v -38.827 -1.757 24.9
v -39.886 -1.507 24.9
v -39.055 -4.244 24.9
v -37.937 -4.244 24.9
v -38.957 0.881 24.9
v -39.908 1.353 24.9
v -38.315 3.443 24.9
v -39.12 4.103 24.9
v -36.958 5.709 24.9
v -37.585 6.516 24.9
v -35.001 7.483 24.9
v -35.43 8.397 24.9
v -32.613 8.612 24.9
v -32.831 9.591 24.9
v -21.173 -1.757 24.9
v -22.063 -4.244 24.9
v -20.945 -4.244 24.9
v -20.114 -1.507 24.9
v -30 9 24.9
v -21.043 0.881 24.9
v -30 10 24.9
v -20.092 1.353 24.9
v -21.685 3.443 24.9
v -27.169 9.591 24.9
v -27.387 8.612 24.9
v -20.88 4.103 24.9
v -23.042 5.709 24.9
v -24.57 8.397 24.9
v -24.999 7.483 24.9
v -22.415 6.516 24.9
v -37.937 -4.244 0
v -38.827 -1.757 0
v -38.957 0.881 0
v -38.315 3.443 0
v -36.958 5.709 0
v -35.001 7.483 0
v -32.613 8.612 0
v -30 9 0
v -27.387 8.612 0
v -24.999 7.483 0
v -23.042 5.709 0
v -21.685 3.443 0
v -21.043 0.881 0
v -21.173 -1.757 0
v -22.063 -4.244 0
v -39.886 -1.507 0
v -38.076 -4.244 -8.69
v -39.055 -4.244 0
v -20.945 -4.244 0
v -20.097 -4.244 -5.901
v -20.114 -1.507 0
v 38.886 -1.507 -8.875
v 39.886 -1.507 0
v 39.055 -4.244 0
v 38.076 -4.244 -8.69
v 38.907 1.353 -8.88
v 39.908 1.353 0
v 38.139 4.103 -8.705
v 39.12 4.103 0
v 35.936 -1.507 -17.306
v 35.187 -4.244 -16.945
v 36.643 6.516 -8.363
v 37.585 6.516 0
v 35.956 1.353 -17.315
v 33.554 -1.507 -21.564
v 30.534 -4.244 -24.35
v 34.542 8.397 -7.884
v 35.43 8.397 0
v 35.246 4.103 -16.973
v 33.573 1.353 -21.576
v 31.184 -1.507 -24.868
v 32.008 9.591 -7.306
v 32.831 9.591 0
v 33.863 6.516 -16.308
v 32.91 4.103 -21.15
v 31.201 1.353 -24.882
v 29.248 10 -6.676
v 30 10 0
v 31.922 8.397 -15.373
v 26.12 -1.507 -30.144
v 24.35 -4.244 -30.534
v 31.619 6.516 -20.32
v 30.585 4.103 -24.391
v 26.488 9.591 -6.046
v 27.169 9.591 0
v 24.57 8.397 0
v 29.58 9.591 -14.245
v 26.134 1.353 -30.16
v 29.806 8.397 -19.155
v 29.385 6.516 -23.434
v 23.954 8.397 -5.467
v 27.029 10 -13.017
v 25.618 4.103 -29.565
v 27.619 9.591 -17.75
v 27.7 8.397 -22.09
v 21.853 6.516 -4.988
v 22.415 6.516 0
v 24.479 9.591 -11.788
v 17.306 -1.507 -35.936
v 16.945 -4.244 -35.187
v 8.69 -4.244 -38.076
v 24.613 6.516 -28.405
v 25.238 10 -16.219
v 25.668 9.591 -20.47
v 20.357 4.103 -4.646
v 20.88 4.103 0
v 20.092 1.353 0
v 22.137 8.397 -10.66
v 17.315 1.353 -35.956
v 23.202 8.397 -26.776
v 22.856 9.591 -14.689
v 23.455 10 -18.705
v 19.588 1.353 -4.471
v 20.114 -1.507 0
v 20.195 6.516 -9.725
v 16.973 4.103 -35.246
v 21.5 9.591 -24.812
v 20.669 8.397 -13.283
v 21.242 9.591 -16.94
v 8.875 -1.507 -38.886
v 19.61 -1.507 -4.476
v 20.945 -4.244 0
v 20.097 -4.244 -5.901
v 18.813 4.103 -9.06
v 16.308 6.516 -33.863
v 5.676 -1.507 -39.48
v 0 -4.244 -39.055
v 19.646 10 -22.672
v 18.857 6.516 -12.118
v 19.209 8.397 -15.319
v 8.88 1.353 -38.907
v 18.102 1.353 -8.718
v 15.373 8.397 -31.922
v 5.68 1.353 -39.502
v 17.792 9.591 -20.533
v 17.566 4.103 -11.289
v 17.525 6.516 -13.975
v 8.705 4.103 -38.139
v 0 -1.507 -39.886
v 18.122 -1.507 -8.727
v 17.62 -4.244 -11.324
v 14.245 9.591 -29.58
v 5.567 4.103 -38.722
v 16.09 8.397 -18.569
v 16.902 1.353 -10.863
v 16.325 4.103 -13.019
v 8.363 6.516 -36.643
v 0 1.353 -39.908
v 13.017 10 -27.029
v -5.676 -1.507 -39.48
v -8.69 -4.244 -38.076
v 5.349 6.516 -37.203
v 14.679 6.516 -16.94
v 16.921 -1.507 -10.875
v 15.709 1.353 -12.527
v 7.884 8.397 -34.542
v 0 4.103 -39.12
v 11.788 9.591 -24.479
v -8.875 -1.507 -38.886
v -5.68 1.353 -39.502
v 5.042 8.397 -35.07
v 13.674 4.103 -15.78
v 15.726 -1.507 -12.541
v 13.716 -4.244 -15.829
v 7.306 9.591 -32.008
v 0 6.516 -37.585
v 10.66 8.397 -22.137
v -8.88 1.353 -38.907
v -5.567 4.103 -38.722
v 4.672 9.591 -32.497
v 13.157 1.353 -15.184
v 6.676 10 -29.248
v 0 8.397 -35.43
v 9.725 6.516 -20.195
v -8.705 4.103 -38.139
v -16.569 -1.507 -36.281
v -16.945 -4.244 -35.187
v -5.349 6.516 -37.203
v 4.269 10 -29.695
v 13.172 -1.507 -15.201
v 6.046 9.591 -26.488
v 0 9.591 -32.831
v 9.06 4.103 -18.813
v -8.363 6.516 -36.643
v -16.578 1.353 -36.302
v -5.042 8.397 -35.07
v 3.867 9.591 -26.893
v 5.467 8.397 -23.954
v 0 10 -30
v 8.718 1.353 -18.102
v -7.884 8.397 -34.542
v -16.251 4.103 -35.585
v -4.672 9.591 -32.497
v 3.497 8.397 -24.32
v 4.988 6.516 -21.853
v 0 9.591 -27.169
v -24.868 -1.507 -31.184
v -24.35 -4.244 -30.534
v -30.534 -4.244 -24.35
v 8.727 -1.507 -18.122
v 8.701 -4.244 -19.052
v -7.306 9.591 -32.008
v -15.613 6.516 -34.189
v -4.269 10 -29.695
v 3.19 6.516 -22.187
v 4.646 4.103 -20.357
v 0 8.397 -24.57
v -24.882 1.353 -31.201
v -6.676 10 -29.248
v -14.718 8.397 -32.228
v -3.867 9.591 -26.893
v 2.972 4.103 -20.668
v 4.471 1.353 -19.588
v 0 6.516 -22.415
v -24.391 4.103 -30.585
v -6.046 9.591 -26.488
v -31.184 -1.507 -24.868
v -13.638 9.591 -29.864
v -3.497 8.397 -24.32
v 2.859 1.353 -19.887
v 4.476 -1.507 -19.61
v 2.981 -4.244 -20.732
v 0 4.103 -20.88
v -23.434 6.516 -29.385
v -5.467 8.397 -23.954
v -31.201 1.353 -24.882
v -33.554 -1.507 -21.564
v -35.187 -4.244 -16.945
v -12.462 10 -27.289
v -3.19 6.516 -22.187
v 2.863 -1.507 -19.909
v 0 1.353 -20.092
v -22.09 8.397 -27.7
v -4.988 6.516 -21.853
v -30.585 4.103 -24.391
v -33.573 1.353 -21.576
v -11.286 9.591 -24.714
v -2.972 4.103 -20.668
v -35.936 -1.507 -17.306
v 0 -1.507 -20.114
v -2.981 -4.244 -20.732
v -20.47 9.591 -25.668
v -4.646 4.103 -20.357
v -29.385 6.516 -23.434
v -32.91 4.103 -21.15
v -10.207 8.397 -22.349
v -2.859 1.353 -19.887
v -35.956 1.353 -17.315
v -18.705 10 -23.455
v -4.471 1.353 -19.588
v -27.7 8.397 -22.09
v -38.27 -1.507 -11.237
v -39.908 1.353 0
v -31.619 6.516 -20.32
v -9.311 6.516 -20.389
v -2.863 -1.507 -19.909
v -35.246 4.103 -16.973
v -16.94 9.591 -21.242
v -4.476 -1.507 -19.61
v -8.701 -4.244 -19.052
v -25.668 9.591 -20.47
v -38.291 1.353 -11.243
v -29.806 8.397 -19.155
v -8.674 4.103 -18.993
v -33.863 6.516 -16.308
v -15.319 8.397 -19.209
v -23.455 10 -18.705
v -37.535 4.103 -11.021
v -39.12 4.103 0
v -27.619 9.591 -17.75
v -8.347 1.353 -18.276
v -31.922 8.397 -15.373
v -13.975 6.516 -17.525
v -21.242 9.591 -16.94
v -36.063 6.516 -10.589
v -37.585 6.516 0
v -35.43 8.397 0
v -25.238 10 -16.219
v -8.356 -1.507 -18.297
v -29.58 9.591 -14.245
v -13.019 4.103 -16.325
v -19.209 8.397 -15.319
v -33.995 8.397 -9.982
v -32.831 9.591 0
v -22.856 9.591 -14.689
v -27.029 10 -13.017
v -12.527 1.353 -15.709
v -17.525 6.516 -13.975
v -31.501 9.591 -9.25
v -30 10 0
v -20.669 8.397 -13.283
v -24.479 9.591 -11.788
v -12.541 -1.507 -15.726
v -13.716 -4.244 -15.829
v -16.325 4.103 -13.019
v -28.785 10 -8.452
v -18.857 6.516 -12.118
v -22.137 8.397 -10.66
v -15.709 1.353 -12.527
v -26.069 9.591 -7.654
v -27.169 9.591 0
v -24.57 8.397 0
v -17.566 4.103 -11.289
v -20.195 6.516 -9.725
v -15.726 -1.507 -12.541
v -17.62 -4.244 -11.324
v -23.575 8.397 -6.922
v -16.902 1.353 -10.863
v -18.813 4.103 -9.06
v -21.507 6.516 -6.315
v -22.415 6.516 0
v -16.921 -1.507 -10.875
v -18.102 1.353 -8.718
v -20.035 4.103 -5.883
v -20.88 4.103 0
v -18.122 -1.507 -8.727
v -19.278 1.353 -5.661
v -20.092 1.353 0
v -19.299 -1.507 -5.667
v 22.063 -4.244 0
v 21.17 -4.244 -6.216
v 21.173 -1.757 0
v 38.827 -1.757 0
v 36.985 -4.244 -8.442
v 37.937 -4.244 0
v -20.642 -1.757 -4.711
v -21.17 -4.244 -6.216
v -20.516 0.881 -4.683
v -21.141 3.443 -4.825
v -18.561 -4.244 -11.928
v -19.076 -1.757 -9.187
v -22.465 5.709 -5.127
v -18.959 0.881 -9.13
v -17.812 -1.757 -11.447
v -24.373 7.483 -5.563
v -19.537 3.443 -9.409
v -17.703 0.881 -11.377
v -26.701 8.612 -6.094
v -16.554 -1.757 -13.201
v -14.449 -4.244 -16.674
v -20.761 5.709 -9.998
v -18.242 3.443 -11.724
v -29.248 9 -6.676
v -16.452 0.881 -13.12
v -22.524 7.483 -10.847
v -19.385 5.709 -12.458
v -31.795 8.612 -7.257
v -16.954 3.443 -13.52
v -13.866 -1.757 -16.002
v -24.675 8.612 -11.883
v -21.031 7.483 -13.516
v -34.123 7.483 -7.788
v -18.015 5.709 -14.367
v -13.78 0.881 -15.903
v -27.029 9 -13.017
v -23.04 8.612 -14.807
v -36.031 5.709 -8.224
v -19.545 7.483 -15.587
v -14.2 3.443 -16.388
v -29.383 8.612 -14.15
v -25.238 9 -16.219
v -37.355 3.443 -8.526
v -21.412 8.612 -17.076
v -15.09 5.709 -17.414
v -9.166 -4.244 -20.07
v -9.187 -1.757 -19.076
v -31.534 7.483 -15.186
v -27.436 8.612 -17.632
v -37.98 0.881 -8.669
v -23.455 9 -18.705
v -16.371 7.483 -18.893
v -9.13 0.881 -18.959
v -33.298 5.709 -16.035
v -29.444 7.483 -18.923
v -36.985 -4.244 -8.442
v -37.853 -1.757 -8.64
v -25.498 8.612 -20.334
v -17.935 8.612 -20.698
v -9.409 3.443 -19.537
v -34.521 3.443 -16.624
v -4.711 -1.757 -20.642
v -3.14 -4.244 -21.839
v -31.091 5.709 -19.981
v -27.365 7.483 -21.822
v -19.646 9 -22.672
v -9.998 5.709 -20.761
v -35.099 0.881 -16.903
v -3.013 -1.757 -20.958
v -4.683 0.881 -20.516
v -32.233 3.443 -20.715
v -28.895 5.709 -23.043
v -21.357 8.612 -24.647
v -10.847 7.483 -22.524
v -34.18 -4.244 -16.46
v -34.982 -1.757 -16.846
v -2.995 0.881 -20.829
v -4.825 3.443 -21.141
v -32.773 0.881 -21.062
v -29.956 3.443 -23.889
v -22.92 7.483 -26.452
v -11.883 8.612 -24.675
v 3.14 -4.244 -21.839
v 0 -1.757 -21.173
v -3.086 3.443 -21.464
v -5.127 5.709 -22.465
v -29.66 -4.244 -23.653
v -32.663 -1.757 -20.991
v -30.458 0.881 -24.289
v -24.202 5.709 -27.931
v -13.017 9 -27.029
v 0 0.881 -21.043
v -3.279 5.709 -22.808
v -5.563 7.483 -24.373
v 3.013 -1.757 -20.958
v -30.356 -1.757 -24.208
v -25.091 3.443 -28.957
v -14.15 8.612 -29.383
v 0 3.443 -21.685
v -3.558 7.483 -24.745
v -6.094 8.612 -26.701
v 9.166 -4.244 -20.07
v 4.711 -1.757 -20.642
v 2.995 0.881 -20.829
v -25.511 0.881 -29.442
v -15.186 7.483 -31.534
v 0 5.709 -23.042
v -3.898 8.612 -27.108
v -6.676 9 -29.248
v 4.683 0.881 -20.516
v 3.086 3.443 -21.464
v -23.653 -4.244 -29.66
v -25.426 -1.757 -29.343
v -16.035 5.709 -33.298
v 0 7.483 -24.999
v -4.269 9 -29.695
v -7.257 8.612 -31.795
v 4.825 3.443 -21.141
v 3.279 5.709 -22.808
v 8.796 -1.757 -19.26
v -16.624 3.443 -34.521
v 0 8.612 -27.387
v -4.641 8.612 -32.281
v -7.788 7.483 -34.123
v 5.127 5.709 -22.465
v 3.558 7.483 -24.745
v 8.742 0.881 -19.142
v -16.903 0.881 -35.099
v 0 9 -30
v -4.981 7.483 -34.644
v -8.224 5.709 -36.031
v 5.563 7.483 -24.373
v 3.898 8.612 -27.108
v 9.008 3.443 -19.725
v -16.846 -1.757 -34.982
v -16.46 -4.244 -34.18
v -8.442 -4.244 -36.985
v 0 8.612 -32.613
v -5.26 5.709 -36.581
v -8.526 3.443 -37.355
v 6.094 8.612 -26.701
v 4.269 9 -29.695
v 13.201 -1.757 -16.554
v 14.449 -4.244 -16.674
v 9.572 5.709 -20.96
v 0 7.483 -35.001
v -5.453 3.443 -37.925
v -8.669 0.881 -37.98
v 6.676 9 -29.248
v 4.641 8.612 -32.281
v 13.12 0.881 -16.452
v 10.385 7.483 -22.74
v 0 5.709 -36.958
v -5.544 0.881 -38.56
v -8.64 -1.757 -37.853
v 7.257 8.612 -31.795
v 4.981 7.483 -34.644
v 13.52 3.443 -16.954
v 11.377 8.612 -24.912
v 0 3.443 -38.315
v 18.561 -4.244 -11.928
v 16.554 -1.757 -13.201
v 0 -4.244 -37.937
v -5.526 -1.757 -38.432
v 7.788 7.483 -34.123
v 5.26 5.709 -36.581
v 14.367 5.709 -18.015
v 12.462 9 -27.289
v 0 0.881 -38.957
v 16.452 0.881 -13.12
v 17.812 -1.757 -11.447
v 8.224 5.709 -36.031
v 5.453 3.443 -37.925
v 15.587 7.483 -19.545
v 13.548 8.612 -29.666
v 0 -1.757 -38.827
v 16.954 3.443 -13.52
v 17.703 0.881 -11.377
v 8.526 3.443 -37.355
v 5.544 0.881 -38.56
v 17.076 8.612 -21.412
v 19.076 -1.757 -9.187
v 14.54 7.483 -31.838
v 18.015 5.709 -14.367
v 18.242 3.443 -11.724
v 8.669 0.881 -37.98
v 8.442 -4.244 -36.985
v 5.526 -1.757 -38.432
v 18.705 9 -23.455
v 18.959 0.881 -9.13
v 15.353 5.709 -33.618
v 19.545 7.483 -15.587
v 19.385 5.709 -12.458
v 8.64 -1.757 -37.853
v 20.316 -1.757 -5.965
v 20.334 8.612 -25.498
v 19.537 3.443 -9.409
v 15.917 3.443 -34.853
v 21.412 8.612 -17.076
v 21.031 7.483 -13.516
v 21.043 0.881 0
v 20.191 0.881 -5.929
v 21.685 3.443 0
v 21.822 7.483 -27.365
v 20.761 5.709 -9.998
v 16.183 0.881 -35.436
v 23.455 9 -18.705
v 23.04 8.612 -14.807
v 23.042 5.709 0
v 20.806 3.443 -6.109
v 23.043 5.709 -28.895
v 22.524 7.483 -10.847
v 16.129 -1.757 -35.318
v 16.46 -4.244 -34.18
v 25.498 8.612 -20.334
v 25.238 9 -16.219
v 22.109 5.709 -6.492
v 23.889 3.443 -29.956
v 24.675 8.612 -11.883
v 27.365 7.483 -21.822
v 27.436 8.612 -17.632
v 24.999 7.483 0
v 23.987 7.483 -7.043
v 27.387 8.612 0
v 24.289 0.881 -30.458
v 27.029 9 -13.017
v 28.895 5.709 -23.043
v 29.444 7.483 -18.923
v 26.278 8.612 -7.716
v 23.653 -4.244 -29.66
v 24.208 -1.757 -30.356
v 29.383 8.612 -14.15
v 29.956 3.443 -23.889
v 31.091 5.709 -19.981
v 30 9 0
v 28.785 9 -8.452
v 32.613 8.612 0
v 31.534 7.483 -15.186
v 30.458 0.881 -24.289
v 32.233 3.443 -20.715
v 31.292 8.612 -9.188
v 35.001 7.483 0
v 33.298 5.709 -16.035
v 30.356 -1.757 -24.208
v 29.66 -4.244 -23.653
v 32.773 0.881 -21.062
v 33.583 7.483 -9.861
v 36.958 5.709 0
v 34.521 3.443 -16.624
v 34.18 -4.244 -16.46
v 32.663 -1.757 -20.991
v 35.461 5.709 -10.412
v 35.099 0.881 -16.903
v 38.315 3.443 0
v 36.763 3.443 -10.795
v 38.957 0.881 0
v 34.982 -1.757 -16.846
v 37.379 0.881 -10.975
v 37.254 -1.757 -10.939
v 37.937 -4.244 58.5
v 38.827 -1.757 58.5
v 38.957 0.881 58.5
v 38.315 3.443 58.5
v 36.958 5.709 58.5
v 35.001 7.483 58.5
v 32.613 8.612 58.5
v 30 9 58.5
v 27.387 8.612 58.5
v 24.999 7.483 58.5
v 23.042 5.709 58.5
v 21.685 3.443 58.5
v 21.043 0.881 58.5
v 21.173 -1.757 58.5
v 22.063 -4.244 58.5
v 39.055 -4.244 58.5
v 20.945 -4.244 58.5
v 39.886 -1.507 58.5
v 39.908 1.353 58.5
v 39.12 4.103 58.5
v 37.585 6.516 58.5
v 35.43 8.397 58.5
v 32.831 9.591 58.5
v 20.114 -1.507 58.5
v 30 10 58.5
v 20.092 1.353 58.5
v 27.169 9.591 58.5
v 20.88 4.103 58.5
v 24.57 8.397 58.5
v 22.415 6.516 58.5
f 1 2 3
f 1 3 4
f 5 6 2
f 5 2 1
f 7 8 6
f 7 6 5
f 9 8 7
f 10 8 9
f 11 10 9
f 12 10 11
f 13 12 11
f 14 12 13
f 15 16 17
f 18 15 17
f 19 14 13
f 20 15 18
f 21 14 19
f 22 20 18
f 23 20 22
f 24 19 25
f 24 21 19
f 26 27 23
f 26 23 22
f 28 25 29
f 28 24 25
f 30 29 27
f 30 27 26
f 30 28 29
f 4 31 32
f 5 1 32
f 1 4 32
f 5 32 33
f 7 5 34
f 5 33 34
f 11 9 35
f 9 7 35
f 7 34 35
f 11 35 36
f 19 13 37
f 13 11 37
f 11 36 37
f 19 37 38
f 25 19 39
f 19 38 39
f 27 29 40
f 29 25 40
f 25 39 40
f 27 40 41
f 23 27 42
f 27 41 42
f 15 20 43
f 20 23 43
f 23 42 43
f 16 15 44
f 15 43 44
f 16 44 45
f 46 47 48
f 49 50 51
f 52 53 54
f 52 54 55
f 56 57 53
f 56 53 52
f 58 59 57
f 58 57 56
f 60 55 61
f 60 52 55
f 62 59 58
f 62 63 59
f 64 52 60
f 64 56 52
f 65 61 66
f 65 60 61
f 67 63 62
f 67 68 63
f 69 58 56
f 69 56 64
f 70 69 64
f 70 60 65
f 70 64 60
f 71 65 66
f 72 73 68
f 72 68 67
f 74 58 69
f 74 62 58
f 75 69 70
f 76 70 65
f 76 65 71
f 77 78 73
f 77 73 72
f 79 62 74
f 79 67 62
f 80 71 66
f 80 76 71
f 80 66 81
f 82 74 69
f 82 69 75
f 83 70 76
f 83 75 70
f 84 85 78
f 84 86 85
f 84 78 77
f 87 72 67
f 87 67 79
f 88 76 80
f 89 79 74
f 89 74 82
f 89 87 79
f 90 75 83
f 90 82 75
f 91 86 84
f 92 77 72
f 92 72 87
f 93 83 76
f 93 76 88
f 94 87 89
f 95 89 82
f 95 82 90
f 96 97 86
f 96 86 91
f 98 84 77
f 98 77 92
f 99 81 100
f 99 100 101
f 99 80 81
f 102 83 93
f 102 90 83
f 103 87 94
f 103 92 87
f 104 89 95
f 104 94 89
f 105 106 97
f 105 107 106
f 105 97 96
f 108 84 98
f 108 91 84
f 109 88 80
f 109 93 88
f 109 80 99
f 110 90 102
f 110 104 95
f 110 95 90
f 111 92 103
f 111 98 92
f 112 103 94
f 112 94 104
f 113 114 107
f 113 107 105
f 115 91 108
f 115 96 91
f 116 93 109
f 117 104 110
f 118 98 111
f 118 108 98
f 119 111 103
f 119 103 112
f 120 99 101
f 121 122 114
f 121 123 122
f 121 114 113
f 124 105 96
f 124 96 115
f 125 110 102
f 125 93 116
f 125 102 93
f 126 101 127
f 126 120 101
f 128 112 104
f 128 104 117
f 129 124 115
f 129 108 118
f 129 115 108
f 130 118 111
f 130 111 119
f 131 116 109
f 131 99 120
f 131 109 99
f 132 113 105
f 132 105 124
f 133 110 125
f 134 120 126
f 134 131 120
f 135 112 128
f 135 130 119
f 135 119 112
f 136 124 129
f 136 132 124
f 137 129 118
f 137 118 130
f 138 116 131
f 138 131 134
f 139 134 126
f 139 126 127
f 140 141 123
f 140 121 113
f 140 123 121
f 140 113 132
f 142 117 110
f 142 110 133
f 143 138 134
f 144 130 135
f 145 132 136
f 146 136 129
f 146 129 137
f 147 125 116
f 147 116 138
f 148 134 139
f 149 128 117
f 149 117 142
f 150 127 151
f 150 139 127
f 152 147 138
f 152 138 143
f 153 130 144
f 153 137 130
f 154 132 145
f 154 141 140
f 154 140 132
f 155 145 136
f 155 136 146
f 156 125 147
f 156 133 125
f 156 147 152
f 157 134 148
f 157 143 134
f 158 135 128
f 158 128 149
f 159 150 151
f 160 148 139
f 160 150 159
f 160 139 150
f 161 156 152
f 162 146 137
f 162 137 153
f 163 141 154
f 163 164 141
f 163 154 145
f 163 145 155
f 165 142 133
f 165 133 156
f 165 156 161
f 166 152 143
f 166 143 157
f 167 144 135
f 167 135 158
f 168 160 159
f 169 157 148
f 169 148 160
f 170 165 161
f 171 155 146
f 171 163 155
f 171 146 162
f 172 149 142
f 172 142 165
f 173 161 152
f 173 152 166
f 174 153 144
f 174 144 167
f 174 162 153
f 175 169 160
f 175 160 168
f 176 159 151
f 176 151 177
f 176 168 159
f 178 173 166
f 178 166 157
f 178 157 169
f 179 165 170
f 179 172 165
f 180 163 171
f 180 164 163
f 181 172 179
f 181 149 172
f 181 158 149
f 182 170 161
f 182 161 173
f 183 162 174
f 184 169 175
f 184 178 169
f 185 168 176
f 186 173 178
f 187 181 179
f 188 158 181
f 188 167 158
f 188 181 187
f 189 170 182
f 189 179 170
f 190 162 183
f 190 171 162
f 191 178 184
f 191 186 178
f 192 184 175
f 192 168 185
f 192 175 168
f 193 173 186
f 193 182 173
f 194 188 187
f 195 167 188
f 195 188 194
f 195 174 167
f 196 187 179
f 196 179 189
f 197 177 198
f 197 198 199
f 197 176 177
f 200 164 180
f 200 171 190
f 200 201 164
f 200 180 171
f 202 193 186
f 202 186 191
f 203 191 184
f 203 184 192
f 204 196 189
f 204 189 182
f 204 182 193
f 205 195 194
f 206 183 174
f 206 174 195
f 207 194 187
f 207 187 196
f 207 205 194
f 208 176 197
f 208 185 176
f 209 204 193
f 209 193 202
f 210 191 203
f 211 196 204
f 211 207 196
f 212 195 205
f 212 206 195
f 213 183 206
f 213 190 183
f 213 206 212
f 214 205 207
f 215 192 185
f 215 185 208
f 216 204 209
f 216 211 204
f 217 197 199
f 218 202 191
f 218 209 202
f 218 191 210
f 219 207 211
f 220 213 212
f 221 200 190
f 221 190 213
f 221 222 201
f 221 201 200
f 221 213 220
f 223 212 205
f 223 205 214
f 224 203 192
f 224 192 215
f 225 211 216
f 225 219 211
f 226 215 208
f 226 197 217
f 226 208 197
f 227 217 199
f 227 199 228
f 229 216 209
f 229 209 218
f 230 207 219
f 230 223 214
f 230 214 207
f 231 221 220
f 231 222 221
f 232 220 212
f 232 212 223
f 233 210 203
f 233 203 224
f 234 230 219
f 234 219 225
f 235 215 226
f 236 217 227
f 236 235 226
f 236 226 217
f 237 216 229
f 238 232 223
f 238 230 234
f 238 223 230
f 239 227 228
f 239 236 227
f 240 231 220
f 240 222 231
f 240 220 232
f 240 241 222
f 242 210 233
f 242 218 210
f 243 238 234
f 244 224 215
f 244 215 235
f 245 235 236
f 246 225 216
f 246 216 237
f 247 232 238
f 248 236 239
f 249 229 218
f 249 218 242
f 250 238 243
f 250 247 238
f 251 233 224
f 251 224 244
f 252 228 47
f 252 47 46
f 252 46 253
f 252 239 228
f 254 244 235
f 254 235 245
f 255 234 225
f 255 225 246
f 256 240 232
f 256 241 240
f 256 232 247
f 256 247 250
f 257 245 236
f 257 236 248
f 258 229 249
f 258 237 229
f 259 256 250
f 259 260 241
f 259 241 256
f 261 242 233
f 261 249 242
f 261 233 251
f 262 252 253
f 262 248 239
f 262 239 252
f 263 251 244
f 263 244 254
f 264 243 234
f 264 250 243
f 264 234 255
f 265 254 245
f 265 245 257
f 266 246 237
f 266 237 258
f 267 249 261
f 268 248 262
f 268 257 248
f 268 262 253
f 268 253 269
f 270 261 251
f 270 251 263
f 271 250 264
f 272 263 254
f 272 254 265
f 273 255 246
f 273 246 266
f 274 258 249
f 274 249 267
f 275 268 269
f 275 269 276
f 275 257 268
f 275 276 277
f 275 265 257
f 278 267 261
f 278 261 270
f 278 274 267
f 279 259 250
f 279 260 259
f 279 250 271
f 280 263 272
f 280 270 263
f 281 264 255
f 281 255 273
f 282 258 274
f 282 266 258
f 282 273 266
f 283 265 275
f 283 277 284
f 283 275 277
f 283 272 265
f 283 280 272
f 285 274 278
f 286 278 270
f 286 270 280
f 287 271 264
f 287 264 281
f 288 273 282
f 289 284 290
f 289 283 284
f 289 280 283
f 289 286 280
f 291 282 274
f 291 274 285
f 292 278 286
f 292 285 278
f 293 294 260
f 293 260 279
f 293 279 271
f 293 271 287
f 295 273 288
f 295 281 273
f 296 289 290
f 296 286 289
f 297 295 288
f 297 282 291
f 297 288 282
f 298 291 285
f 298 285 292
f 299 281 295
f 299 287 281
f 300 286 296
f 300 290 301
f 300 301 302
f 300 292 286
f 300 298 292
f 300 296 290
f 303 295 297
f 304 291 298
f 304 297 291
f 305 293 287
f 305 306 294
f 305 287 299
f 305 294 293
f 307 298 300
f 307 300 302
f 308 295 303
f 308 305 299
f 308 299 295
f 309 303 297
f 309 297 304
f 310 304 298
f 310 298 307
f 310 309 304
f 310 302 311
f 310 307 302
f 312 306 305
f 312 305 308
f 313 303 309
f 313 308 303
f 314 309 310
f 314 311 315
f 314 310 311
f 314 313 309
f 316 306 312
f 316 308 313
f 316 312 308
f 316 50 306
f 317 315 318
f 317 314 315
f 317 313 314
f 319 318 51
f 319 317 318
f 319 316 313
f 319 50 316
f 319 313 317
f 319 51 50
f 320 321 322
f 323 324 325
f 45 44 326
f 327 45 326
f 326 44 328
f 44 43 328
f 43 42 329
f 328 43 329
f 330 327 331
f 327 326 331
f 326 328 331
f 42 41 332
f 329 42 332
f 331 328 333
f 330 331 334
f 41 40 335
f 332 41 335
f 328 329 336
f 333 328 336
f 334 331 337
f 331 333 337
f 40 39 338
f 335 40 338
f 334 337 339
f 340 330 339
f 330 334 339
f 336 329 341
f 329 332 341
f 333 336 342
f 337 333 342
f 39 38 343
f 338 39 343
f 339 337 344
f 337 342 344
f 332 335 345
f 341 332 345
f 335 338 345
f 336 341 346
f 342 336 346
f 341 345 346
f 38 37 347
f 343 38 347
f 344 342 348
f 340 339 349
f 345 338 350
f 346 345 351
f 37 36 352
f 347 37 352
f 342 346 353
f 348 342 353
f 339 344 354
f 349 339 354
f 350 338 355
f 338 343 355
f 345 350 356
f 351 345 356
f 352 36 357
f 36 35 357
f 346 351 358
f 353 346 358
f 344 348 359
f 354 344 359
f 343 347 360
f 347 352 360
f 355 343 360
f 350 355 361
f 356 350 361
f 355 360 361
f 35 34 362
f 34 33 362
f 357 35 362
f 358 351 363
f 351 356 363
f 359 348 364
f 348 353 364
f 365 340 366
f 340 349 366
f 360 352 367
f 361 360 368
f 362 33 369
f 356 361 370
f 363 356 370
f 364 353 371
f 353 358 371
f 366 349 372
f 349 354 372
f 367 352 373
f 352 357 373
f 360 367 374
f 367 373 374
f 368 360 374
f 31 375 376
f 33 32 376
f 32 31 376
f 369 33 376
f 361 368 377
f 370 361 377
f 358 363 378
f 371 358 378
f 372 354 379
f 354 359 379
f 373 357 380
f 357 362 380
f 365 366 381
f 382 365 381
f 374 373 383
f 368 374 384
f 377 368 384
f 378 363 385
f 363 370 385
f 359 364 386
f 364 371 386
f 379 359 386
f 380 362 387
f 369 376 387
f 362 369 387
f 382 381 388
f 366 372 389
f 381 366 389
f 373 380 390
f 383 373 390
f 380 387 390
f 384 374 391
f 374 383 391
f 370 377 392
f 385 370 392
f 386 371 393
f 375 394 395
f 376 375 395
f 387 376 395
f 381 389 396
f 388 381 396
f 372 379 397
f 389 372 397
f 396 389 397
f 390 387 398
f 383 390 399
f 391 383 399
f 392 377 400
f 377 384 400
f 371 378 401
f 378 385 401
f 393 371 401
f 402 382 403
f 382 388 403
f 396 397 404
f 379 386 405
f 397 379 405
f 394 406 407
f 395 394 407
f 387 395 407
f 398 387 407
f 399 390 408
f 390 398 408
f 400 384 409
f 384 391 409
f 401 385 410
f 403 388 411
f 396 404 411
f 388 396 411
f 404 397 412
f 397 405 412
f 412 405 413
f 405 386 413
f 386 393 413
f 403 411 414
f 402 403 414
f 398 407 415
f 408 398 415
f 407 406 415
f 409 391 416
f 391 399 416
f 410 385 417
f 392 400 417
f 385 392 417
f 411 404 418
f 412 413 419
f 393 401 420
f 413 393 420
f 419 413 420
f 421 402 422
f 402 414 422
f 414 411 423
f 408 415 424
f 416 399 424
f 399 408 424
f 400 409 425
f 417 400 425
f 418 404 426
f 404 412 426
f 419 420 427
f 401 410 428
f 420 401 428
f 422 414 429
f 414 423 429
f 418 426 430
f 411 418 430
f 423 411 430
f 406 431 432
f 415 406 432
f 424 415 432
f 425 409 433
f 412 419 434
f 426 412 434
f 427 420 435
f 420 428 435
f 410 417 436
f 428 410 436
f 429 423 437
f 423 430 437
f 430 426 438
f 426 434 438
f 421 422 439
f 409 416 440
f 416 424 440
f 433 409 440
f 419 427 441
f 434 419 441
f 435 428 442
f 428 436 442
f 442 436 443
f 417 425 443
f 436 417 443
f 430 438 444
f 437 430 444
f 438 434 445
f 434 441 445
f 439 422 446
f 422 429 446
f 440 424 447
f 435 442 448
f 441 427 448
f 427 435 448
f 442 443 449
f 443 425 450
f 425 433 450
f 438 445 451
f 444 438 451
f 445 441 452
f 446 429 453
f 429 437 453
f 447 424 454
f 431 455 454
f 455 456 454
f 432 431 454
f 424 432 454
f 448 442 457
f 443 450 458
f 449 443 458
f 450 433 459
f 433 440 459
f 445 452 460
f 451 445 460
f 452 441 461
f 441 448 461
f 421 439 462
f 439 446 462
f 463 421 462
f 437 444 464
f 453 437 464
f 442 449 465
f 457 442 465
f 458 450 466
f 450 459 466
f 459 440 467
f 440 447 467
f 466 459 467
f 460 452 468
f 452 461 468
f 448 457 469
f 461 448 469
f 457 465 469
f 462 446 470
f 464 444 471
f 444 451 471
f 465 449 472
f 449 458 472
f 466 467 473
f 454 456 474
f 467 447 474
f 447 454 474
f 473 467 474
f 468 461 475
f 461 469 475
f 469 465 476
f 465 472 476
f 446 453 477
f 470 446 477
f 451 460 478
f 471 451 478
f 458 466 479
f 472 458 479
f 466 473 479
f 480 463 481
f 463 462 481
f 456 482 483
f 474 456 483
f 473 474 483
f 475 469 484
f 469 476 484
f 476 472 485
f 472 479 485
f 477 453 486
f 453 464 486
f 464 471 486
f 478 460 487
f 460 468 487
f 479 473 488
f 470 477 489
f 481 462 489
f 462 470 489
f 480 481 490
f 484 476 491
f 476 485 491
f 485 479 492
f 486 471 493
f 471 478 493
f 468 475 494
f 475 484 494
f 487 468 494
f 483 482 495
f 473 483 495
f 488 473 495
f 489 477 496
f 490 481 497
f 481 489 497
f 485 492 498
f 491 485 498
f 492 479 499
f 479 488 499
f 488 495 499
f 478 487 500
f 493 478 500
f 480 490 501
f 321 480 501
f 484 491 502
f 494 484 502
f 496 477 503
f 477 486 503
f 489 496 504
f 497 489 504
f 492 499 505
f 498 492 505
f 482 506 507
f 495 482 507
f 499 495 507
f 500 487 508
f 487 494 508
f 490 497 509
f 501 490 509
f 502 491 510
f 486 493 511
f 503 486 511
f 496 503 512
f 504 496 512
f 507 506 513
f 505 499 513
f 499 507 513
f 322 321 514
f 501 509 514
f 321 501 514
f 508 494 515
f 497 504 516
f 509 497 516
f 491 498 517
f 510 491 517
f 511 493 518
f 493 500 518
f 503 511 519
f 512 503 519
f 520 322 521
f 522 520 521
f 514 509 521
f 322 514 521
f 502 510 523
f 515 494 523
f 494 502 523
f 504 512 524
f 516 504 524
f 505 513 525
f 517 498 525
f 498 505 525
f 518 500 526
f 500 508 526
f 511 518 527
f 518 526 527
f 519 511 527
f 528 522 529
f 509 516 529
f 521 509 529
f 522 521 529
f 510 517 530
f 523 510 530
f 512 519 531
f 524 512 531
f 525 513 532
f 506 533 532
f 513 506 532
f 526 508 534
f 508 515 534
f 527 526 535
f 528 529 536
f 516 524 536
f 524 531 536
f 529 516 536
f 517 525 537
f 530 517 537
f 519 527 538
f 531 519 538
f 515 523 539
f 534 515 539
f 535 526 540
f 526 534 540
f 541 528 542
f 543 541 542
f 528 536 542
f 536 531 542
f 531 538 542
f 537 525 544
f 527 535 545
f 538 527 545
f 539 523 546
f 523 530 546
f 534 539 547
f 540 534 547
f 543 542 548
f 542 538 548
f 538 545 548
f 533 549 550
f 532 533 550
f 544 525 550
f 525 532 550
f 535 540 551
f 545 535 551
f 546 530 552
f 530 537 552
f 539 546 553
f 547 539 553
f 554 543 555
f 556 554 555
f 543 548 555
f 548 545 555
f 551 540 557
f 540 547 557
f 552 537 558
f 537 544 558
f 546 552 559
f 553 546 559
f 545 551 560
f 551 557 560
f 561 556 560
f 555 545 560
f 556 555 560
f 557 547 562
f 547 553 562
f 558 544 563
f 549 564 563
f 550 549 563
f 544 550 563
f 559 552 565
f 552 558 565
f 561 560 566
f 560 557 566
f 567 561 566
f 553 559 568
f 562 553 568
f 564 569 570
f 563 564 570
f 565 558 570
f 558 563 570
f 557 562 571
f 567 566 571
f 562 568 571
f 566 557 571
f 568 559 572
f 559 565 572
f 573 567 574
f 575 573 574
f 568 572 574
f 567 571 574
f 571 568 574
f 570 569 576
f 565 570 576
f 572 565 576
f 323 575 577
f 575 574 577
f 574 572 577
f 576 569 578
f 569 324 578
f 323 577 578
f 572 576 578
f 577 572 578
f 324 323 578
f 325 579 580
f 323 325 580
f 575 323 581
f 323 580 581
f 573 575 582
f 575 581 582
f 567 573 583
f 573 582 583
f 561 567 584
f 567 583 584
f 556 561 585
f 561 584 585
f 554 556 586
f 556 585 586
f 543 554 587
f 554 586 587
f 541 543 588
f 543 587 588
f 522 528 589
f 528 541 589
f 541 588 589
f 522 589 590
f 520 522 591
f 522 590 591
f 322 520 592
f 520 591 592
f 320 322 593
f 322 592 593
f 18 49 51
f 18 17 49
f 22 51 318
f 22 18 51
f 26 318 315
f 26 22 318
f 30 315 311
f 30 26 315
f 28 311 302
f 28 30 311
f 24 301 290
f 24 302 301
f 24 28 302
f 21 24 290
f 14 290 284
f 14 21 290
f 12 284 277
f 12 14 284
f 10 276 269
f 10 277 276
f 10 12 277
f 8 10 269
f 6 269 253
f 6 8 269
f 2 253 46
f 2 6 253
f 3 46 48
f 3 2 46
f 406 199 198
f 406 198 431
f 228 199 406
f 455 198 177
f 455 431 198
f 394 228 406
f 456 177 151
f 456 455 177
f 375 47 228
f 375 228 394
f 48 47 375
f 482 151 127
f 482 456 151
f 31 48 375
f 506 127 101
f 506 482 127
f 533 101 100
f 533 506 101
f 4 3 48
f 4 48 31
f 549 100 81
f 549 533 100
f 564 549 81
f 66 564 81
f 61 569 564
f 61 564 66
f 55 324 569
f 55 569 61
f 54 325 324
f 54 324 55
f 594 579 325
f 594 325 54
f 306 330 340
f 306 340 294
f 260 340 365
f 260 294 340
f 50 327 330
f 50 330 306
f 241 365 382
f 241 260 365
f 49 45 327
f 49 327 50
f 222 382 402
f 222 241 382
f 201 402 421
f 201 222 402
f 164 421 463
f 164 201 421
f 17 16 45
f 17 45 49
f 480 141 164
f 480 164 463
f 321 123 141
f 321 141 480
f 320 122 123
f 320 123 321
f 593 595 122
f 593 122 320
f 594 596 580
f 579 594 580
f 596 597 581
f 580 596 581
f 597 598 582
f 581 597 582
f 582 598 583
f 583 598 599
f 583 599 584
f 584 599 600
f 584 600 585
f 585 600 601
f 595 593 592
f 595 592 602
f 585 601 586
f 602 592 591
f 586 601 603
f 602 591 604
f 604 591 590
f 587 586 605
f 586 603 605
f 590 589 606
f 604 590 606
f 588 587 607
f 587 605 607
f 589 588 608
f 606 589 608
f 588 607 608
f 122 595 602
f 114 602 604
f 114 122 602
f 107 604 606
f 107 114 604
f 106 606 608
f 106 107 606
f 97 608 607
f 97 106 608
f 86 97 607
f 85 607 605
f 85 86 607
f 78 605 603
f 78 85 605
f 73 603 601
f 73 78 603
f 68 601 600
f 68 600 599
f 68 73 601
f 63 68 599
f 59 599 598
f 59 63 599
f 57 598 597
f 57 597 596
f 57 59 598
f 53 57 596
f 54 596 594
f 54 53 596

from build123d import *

# Parameters (mm, degrees)
F2_R     = 10
F4_R     = 9
F6_W     = 85.2154158056
F6_H     = 10.0725549273
F7_DEPTH = 60


with BuildPart() as f3:
    # F3: sweep along a path in F0
    with BuildLine(Plane.XZ) as f3_path:
        Line((30, 58.5), (30, 0))
        ThreePointArc((30, 0), (0, -30), (-30, 0))
        Line((-30, 0), (-30, 24.9))
    # F2 (on line) → F3 (sweep)
    with BuildSketch(Plane(origin=(0, 0, 58.5), x_dir=(1, 0, 0), z_dir=(0, 0, -1))):
        with Locations((30, 0)):
            Circle(F2_R)
    sweep(path=f3_path.line)

    # F5: sweep along a path in F0
    with BuildLine(Plane.XZ) as f5_path:
        Line((-30, 24.9), (-30, 0))
        ThreePointArc((-30, 0), (0, -30), (30, 0))
        Line((30, 0), (30, 58.5))
    # F4 (on face) → F5 (sweep, cut)
    with BuildSketch(Plane.XY.offset(58.5)):
        with Locations((30, 0)):
            Circle(F4_R)
    sweep(path=f5_path.line, mode=Mode.SUBTRACT)


with BuildPart() as f7:
    # F6 (on Top) → F7 (new body, symmetric)
    with BuildSketch(Plane.XY):
        with Locations((-1.6176421195, -9.2803204898)):
            Rectangle(F6_W, F6_H)
    extrude(amount=F7_DEPTH, both=True)


with BuildPart() as f3_1:
    add(f3.part)

    # F8: cut F7
    add(f7.part, mode=Mode.SUBTRACT)


solid = f3_1.part
